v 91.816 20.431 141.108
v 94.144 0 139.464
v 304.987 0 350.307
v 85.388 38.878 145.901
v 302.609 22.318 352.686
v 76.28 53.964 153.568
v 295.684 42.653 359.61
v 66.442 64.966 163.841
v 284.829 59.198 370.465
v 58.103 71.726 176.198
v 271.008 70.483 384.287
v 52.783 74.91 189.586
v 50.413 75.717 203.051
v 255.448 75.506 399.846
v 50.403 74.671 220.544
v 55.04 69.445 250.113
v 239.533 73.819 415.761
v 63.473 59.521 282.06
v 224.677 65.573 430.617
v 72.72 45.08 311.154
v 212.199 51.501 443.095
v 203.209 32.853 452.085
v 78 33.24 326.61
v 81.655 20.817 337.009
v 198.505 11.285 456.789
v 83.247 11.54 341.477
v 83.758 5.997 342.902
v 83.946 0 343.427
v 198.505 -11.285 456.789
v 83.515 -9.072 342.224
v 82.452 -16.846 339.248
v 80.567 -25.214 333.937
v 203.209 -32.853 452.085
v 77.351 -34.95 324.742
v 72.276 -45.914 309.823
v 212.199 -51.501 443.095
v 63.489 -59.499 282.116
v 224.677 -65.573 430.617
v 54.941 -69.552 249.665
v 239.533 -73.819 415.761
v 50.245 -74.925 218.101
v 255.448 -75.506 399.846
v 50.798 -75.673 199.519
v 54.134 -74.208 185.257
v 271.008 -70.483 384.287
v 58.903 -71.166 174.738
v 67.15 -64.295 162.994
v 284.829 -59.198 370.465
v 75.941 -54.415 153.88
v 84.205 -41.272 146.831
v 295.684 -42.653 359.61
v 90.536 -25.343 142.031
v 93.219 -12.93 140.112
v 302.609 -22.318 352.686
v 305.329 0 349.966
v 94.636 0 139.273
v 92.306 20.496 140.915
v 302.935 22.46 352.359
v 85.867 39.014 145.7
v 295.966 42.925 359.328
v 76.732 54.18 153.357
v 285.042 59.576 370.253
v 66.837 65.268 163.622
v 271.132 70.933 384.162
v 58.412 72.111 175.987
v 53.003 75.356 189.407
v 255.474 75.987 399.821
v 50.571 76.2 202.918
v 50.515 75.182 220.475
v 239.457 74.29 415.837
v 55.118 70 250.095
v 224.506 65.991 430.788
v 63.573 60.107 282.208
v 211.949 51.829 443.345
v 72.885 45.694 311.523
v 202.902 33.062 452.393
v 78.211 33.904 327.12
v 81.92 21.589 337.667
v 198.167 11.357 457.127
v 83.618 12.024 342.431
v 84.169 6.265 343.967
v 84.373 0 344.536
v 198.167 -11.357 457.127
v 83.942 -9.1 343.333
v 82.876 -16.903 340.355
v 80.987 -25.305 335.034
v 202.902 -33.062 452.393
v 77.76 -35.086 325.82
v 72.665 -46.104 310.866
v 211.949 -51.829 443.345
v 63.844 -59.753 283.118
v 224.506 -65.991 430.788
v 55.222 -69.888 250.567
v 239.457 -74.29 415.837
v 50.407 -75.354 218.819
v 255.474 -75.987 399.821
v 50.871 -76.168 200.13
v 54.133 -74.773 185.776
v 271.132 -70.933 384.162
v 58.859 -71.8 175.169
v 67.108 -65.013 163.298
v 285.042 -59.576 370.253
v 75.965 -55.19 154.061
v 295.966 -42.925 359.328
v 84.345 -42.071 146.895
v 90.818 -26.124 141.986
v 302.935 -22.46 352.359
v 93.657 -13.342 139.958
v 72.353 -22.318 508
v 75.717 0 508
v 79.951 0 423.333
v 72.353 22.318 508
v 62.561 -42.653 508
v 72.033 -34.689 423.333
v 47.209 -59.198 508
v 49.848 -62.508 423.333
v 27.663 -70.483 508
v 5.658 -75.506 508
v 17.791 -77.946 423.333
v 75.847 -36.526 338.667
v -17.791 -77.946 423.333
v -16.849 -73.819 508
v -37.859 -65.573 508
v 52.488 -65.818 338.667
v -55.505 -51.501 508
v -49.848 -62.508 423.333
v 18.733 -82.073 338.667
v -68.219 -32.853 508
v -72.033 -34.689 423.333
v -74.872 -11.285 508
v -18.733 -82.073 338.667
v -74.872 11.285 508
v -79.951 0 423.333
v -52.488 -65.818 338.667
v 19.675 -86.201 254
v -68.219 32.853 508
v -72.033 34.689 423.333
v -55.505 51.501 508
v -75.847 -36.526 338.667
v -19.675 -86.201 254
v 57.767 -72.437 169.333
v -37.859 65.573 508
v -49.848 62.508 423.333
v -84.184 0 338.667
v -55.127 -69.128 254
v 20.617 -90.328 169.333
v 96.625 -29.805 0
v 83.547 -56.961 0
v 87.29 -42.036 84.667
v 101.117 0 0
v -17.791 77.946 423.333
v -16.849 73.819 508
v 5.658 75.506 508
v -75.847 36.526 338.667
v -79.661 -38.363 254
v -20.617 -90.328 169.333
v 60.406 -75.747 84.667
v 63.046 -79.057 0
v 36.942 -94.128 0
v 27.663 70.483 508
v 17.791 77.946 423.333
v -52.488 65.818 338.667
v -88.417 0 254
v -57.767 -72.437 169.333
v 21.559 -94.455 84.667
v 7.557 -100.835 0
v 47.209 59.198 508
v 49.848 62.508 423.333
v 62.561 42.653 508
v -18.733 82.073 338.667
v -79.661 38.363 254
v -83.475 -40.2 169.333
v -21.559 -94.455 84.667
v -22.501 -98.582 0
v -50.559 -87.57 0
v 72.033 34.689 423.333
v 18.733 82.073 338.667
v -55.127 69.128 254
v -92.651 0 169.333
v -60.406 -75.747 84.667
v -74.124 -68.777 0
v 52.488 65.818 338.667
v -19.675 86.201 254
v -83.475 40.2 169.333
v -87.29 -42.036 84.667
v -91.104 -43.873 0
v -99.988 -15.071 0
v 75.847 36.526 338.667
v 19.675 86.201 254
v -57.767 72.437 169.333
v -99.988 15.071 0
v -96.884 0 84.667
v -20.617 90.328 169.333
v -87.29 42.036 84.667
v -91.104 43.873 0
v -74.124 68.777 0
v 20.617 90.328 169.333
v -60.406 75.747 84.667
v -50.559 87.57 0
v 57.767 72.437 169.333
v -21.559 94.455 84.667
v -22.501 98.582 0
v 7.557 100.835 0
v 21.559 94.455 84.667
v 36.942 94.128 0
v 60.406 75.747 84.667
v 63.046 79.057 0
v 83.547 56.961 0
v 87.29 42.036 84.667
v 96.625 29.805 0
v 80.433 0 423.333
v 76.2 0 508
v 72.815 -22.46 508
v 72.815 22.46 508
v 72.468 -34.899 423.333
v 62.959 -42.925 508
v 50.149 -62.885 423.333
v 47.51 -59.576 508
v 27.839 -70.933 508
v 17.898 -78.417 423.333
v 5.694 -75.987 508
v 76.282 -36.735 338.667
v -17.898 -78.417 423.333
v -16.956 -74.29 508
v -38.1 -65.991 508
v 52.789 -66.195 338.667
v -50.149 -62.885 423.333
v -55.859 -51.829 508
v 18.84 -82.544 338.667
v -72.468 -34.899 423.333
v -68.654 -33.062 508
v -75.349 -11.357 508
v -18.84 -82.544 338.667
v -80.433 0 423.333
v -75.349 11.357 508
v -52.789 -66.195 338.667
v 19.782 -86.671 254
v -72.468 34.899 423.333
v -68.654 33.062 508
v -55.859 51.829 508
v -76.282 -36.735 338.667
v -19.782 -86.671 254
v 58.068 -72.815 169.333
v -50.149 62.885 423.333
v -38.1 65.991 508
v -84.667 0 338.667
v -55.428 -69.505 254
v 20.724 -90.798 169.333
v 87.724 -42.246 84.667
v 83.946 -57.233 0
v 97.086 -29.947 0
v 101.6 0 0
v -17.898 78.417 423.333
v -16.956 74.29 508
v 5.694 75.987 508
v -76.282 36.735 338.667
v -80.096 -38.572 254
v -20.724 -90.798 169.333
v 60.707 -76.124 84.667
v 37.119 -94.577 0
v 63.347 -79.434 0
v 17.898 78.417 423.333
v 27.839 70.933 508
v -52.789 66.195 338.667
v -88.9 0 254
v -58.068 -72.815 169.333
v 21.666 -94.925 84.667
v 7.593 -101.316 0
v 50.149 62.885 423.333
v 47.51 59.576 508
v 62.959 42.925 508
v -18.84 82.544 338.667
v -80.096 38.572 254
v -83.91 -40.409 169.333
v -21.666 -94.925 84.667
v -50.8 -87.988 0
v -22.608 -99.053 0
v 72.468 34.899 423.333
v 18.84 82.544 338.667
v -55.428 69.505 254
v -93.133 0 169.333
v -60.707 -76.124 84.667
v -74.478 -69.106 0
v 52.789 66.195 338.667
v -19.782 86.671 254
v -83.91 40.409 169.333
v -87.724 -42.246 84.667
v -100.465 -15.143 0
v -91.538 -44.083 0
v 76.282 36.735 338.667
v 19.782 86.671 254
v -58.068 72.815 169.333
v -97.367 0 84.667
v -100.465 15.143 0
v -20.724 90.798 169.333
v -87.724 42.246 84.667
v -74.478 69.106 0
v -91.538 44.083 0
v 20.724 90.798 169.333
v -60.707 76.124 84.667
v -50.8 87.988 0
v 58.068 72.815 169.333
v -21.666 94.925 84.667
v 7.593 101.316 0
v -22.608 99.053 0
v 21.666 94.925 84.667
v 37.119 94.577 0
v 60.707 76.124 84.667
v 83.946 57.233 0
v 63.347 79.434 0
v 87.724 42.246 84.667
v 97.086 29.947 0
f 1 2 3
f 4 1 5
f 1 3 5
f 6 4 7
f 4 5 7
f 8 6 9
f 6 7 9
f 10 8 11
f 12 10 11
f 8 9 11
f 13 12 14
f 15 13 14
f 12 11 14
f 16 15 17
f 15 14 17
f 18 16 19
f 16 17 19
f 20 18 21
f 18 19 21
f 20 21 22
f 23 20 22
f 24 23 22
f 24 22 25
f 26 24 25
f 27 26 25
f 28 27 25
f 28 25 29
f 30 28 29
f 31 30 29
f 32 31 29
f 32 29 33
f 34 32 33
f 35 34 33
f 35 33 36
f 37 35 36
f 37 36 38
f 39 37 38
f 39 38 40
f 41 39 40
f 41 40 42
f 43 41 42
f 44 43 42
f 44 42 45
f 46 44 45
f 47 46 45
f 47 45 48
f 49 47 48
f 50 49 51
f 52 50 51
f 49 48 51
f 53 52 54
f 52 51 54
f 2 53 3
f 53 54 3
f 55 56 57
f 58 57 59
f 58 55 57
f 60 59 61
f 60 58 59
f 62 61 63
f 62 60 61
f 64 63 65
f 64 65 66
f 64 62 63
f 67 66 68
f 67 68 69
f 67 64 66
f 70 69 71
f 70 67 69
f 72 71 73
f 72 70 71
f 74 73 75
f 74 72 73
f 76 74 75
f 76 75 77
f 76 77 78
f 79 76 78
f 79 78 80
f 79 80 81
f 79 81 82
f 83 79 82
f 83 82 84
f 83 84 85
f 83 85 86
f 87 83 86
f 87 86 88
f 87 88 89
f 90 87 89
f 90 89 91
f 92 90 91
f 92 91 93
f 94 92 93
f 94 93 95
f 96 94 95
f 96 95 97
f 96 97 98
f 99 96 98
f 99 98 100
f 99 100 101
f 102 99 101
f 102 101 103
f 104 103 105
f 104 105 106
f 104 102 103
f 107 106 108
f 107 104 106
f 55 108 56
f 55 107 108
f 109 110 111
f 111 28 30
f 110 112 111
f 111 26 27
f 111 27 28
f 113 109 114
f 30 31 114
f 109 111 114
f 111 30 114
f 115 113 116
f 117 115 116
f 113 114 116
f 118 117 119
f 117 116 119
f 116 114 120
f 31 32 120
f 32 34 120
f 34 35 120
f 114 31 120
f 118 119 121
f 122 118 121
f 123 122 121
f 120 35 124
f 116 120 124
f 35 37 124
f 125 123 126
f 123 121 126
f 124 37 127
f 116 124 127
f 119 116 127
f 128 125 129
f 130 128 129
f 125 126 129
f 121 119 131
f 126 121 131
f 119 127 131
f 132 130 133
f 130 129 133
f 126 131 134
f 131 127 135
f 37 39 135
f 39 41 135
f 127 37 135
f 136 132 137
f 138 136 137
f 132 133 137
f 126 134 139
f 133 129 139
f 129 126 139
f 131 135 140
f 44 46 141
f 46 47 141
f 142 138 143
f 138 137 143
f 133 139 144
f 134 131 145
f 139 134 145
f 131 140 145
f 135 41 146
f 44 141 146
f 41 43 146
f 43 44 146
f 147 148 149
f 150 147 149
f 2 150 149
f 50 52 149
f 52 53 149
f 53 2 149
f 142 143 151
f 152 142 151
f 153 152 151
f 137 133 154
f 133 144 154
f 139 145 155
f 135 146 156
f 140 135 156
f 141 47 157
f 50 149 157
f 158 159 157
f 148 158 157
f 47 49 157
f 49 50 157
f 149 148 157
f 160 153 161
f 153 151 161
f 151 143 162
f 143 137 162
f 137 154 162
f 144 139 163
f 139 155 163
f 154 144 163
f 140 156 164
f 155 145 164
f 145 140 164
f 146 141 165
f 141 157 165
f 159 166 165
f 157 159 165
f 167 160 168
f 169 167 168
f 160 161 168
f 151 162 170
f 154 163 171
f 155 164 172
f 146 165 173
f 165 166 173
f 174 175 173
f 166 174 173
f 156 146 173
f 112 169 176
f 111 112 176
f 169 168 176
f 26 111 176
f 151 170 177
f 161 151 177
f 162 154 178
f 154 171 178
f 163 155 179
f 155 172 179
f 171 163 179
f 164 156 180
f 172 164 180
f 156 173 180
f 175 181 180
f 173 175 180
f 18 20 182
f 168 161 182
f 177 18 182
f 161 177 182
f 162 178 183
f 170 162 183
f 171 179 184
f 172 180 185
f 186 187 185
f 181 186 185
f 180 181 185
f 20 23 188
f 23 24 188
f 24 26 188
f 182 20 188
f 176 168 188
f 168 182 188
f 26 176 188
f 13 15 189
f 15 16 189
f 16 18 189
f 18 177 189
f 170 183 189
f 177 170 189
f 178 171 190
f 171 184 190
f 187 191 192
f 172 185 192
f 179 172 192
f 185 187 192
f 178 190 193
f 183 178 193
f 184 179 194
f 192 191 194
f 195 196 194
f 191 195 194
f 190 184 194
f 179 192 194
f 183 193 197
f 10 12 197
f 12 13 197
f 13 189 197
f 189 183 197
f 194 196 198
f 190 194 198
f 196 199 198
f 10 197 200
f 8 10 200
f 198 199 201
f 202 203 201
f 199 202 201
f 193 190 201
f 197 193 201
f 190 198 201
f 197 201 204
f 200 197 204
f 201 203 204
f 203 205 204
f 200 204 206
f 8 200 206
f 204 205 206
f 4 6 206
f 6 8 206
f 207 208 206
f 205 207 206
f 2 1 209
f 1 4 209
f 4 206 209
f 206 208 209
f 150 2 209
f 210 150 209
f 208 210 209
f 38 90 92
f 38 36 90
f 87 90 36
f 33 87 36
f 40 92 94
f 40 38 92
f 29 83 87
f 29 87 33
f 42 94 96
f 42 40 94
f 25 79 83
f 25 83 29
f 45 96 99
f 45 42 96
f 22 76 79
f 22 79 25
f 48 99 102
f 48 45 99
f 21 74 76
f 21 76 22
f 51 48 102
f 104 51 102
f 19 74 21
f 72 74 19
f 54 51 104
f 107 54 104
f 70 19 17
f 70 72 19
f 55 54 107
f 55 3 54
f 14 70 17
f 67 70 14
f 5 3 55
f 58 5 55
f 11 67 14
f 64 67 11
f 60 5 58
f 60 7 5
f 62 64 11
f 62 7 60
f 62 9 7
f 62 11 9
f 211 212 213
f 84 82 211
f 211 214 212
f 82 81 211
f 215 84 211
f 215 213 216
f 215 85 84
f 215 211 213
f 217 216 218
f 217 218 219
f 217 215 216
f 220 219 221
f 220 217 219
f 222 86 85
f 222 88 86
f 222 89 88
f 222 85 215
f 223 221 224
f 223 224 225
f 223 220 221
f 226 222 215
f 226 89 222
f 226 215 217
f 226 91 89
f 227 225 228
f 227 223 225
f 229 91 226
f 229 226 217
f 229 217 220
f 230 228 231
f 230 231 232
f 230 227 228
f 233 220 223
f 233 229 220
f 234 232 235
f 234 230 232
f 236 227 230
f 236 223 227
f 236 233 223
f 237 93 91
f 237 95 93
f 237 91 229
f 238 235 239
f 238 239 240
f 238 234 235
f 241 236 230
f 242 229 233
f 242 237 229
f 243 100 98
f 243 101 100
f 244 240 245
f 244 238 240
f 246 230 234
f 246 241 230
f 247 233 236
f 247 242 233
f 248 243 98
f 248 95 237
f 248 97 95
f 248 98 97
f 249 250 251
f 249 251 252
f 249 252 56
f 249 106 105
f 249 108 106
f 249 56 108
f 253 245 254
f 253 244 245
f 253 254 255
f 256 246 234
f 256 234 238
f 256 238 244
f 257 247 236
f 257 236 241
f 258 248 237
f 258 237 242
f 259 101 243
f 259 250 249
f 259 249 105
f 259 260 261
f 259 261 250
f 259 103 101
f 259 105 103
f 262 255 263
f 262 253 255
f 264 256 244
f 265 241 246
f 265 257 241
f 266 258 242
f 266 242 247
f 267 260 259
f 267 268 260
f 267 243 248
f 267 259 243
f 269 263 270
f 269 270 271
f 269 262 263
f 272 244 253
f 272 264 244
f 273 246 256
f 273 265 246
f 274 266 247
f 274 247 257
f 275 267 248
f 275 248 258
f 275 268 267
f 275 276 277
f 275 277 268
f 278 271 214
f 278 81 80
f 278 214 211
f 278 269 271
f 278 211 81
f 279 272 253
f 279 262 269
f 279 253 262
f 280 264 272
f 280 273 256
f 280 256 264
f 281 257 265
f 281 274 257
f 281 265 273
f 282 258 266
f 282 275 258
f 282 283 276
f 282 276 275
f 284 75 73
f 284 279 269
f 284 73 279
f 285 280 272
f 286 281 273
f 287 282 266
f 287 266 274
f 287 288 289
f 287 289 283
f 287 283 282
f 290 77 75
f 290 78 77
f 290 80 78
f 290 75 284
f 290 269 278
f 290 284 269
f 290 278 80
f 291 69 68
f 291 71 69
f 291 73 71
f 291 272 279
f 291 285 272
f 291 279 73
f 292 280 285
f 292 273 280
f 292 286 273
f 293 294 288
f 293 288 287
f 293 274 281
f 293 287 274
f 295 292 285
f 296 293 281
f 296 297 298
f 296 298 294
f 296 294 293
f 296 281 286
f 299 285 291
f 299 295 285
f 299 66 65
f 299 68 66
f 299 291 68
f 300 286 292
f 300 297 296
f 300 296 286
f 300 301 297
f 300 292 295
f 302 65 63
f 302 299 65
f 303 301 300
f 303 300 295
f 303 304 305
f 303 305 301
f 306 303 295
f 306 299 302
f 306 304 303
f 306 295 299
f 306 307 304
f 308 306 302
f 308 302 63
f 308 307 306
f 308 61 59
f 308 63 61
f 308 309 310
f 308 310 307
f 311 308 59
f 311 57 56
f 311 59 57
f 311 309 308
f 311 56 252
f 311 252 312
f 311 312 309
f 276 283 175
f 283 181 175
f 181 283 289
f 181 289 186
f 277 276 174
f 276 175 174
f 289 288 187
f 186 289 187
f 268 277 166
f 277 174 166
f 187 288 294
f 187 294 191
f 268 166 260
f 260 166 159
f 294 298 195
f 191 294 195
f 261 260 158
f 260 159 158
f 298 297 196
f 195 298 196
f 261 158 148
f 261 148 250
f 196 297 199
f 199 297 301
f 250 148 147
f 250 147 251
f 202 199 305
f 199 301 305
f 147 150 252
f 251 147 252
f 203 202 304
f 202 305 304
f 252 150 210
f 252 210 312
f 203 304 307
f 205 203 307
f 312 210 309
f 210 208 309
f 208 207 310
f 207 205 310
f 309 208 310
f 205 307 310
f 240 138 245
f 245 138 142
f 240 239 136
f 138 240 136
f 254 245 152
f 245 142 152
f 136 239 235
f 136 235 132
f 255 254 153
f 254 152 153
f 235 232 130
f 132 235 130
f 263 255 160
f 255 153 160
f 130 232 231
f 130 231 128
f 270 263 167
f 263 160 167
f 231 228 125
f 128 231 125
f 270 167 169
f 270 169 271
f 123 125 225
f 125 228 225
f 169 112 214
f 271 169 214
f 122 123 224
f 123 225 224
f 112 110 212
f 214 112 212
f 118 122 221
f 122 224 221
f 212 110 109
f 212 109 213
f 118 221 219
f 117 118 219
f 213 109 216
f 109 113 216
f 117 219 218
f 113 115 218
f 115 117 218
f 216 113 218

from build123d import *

# Parameters (mm, degrees)
F5_R      = 76.2
F4_R      = 101.6
F7_R      = 76.2
F8_DEPTH  = 304.8
F9_R      = 75.7174
F12_DEPTH = 304.8
F10_R     = 75.7174
F11_R     = 101.1174


with BuildPart() as f6:
    # F5 (on face) → F6 section 0
    with BuildSketch(Plane(origin=(0, 0, 508), x_dir=(1, 0, 0), z_dir=(0, 0, -1))):
        Circle(F5_R)
    # F4 (on face) → F6 section 1
    with BuildSketch(Plane.XY):
        Circle(F4_R)
    loft()

    # F7 (on face) → F8 (join)
    with BuildSketch(Plane(origin=(327.647171, 0, 327.647171), x_dir=(0.707107, 0, -0.707107), z_dir=(0.707107, 0, 0.707107))):
        with Locations((-107.763073, 0)):
            Circle(F7_R)
    extrude(amount=-F8_DEPTH)

    # F9 (on face) → F12 (cut)
    with BuildSketch(Plane(origin=(327.647171, 0, 327.647171), x_dir=(0.707107, 0, -0.707107), z_dir=(0.707107, 0, 0.707107))):
        with Locations((-107.763073, 0)):
            Circle(F9_R)
    extrude(amount=-F12_DEPTH, mode=Mode.SUBTRACT)

    # F10 (on face) → F13 section 0
    with BuildSketch(Plane(origin=(0, 0, 508), x_dir=(1, 0, 0), z_dir=(0, 0, -1))):
        Circle(F10_R)
    # F11 (on face) → F13 section 1
    with BuildSketch(Plane.XY):
        Circle(F11_R)
    loft(mode=Mode.SUBTRACT)


solid = f6.part
